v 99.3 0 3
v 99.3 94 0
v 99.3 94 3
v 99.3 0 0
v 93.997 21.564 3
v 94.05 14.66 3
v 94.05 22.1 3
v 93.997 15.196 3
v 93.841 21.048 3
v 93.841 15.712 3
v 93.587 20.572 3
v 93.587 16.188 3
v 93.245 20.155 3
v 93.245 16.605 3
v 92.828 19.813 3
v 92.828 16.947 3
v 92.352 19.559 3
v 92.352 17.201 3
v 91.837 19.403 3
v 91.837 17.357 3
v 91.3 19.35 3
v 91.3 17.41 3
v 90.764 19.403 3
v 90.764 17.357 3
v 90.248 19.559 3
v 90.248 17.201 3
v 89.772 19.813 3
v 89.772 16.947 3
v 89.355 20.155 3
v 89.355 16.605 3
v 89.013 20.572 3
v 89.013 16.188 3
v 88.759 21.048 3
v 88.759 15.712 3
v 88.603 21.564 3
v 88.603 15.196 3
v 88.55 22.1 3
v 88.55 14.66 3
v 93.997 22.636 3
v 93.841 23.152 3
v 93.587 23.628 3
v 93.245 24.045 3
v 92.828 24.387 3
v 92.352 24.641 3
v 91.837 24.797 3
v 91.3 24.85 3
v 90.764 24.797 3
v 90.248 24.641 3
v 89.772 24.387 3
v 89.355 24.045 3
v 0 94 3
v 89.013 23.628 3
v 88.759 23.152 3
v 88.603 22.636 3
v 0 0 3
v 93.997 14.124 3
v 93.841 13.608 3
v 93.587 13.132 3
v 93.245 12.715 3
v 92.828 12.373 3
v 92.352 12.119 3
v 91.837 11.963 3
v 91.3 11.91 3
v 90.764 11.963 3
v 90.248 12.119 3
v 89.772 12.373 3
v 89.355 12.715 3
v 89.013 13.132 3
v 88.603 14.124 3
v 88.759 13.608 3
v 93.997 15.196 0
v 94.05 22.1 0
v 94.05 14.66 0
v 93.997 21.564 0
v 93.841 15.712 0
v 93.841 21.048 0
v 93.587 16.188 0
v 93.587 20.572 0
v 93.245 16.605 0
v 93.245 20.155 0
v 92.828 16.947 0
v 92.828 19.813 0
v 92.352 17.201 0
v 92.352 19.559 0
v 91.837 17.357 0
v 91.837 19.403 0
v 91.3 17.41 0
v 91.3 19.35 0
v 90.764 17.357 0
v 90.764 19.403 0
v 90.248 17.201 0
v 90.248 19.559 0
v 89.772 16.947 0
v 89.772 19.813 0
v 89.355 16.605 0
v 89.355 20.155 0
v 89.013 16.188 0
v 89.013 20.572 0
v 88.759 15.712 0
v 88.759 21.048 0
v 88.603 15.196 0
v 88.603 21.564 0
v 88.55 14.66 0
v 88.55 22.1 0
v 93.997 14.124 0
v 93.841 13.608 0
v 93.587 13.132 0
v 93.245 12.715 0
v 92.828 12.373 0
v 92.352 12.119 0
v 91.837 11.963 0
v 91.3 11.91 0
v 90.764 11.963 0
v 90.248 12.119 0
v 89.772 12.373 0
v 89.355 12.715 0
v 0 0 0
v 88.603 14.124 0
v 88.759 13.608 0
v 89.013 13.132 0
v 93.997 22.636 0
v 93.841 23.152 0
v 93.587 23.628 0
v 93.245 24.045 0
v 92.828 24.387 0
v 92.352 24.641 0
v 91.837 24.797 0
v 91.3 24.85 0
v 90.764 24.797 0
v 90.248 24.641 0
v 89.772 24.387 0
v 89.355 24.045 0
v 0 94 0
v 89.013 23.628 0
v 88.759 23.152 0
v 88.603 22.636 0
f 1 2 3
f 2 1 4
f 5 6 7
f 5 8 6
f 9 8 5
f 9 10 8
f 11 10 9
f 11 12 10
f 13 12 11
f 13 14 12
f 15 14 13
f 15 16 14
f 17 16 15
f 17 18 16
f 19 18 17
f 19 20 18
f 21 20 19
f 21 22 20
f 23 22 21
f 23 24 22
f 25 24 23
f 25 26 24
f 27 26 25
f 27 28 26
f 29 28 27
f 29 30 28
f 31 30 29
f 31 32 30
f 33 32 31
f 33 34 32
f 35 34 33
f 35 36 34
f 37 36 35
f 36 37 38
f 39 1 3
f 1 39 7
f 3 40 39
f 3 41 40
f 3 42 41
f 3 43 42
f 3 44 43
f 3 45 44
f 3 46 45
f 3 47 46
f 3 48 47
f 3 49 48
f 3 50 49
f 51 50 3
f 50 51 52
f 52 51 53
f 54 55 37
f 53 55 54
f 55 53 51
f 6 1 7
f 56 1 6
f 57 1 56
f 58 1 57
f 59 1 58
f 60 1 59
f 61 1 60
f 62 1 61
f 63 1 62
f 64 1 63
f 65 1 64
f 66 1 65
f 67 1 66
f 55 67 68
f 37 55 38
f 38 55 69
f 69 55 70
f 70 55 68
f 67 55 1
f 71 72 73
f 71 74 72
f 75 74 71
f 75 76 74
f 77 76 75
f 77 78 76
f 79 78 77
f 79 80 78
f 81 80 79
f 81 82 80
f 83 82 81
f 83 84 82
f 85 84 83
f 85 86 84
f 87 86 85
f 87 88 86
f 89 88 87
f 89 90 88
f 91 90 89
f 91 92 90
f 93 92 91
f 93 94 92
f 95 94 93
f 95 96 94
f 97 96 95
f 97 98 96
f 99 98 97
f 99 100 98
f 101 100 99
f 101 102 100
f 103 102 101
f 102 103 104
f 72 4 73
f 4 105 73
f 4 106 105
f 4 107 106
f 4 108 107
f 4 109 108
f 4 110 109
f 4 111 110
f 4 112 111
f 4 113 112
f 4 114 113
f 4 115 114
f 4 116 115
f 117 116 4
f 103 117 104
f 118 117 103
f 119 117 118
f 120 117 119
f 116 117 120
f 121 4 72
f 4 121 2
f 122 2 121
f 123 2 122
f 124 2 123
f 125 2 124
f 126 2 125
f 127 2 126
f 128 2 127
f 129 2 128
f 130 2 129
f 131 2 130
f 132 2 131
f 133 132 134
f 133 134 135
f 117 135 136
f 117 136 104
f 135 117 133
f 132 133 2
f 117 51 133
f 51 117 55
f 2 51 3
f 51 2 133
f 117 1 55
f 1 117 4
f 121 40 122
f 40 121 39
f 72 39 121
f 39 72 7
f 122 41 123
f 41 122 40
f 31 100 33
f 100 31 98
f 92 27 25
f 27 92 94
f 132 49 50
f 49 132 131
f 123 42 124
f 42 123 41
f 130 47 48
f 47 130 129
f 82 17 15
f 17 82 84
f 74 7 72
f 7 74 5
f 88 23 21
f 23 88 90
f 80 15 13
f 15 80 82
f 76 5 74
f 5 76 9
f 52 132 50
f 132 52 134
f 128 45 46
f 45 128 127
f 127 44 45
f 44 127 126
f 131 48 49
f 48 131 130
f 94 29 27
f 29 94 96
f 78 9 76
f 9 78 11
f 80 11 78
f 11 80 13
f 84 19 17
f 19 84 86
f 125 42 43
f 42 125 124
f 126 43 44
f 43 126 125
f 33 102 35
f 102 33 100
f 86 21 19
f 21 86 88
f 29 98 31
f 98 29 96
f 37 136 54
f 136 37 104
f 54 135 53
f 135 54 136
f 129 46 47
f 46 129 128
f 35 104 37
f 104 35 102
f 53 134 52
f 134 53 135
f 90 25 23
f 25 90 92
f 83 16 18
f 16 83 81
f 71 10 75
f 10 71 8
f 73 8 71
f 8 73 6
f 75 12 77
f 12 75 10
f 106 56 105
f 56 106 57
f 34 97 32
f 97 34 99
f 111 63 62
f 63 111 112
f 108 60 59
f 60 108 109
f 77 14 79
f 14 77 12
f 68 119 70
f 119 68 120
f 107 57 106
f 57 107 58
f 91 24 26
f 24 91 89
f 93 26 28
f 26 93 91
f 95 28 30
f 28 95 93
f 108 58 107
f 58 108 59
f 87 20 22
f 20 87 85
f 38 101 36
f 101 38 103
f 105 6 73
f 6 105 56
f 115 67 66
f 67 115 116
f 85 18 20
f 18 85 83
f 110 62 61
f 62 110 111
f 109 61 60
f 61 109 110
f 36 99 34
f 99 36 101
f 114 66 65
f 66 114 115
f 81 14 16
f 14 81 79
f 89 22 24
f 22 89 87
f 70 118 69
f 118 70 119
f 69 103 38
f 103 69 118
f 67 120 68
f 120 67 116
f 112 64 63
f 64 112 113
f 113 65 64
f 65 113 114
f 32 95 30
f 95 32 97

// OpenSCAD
// ============================================================
// Gabinete - ModemEYSE4G_LTE_Cat1_simA7670SA - TAPA
// Pieza separada: solo la tapa superior, con los calados de
// los LEDs D2/D3. La base esta en el archivo
// gabinete_ModemEYSE4G_base_6.scad
// Mismo sistema de coordenadas y mismos parametros de placa
// que la base, para que las dimensiones exteriores coincidan.
// ============================================================

// ---------- PARAMETROS DE LA PLACA ----------
board_x = 90.3;         // ancho de la placa (mm)
board_y = 85.0;         // alto de la placa (mm)

// ---------- PARAMETROS DEL GABINETE ----------
wall = 3.0;             // espesor de pared, hacia afuera (mm) - definido por Damian
lid_thickness = 3.0;    // espesor de la tapa superior - definido por Damian
clearance_xy = 1.5;     // holgura alrededor de la placa (mm)

// ---------- ESPEJADO EN X ----------
// Mismo criterio que en la base: las coordenadas X de los LEDs se
// espejan porque la placa se monta con la cara de componentes hacia
// arriba, invirtiendo el eje X respecto a como lo guarda KiCad.
mirror_x = true;
function mx(x) = mirror_x ? (board_x - x) : x;

// ---------- LEDS (calado en la tapa) ----------
// Coordenadas X crudas de KiCad, ya pasadas por mx().
led_D2 = [mx(3.5), 17.6];
led_D3 = [mx(3.5), 10.16];
led_hole_d = 5.5; // LED THT de 5mm + holgura - AJUSTAR a gusto (diametro real vs. luz difusa)

// ============================================================
// MODULO
// ============================================================

// Dimensiones exteriores totales de la caja (deben coincidir con las
// de gabinete_ModemEYSE4G_base_6.scad para que la tapa calce bien)
outer_x = board_x + 2 * (wall + clearance_xy);
outer_y = board_y + 2 * (wall + clearance_xy);
offset_x = wall + clearance_xy; // offset del (0,0) de la placa dentro de la caja
offset_y = wall + clearance_xy;

// Tapa superior: mismas dimensiones XY exteriores que la caja,
// espesor lid_thickness. Se imprime aparte y se apoya sobre el
// borde superior de las paredes.
module tapa() {
    difference() {
        cube([outer_x, outer_y, lid_thickness]);

        // Calados de los LEDs D2 y D3 (posicion real tomada del PCB)
        translate([led_D2[0] + offset_x, led_D2[1] + offset_y, -1])
            cylinder(h = lid_thickness + 2, d = led_hole_d, $fn = 32);
        translate([led_D3[0] + offset_x, led_D3[1] + offset_y, -1])
            cylinder(h = lid_thickness + 2, d = led_hole_d, $fn = 32);
    }
}

tapa();
